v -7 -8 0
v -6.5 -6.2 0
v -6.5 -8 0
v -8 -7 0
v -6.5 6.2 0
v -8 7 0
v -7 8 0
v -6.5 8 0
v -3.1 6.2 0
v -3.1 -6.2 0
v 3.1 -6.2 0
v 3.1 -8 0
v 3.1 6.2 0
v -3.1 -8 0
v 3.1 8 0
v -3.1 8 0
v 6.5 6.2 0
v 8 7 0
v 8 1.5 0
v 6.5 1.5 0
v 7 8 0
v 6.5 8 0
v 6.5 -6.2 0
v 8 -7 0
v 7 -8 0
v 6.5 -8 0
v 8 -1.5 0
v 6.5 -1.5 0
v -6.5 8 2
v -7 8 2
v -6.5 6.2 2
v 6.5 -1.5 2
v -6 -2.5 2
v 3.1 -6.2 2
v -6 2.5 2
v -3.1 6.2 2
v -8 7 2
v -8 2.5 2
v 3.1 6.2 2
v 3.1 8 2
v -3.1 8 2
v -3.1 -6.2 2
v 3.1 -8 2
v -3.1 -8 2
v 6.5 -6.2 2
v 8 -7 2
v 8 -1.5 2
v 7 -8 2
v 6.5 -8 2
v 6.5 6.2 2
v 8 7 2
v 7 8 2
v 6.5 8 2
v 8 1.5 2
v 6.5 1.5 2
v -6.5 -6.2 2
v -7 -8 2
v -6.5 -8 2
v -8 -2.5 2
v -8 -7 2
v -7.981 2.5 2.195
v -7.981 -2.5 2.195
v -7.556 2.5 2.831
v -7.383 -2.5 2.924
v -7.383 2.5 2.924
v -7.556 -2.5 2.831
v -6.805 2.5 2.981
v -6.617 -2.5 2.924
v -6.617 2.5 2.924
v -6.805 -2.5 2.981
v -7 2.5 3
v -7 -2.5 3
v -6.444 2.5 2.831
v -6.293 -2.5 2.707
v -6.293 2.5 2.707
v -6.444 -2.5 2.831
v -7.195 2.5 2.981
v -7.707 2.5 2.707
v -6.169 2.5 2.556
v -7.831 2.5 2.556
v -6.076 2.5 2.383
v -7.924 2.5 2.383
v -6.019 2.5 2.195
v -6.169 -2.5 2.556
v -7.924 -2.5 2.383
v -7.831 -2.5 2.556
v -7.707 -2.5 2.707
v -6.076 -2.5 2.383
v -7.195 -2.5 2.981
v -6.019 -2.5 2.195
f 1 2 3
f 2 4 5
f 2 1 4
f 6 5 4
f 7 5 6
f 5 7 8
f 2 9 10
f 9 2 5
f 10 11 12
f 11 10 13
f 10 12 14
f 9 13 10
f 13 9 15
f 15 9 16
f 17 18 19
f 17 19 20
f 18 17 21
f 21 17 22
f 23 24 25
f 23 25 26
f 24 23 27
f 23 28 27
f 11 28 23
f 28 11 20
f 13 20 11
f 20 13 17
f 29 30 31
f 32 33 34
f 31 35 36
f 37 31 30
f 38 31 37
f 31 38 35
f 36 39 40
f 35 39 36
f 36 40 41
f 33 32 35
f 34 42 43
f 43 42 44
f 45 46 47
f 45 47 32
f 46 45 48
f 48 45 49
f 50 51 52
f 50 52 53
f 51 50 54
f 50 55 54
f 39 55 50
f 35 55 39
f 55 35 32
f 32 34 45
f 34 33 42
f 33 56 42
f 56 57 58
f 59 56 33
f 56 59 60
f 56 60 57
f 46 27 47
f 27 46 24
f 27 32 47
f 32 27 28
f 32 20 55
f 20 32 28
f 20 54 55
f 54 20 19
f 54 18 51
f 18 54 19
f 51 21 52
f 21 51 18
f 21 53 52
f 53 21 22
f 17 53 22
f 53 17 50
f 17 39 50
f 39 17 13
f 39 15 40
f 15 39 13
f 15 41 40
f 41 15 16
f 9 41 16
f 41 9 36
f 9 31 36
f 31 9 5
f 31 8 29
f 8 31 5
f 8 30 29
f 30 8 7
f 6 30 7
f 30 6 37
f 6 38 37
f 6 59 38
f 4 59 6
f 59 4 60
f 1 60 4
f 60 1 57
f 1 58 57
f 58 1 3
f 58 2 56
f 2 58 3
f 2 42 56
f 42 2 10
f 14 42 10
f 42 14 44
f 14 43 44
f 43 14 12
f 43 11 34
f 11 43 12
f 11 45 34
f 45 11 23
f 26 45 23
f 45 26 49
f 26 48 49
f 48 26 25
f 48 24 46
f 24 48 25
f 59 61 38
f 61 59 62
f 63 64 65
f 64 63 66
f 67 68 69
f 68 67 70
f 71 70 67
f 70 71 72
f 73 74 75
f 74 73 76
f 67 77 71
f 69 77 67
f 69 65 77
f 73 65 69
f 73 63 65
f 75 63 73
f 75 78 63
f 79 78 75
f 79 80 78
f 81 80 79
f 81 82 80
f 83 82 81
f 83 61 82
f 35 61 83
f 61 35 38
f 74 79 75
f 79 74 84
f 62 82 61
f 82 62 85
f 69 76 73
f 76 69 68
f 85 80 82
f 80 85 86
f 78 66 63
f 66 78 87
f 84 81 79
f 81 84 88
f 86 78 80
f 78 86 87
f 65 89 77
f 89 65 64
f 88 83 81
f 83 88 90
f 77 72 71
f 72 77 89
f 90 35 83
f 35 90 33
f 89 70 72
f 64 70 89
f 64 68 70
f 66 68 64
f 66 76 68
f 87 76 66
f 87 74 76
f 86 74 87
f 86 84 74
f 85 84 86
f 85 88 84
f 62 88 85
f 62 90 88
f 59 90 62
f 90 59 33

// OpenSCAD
//include <CenterStageField.scad>

PRINT_SCALER = 1;  // SET TO 1 FOR INCHES, 25.4 FOR MM

ROBOT_LENGTH = 16.0*PRINT_SCALER;
ROBOT_WIDTH  = 16.0*PRINT_SCALER;
CHAMF = 1.0*PRINT_SCALER;
ROBOT_HEIGHT = 2*PRINT_SCALER;
WHEEL_LEN    = 1.4*PRINT_SCALER;
WHEEL_WID    = 2.0*PRINT_SCALER;

function shiftStart(inX)     = -(inX+24);
function invertSpike(inPos)  = inPos-47;
function flipHeading(inHead) = inHead-180;  // used on blue side
function invertRight(inPos)  = -inPos-17;   // used on blue side
function flipValue(inPos)    = -inPos;      // used on blue side

function invertLeft(inPos) = -(inPos+34);   // used on red side

module robot_2D() {        
    difference() {
        polygon([[ROBOT_LENGTH/2,ROBOT_WIDTH/2-CHAMF],
        [ROBOT_LENGTH/2-CHAMF,ROBOT_WIDTH/2],
        [-ROBOT_LENGTH/2+CHAMF,ROBOT_WIDTH/2],
        [-ROBOT_LENGTH/2,ROBOT_WIDTH/2-CHAMF],
        [-ROBOT_LENGTH/2,-ROBOT_WIDTH/2+CHAMF],
        [-ROBOT_LENGTH/2+CHAMF,-ROBOT_WIDTH/2],
        [ROBOT_LENGTH/2-CHAMF,-ROBOT_WIDTH/2],
        [ROBOT_LENGTH/2,-ROBOT_WIDTH/2+CHAMF]]);
        //square([ROBOT_LENGTH,ROBOT_WIDTH],center=true); // represents robot outline
        
        // represents purple pixel holder in front of robot
        translate([ROBOT_LENGTH/2,0,0]) square([3*PRINT_SCALER,3*PRINT_SCALER],center=true);
        
        // represents robot wheels
        translate([ROBOT_LENGTH*.3,ROBOT_WIDTH*.45,0]) wheel();
        translate([-ROBOT_LENGTH*.3,ROBOT_WIDTH*.45,0]) wheel();
        translate([ROBOT_LENGTH*.3,-ROBOT_WIDTH*.45,0]) wheel();
        translate([-ROBOT_LENGTH*.3,-ROBOT_WIDTH*.45,0]) wheel();
    }
    module wheel() {
        hull() {
            translate([WHEEL_LEN/2,0,0]) square(WHEEL_WID,center=true);
            translate([-WHEEL_LEN/2,0,0]) square(WHEEL_WID,center=true);
        }
    }
}
//robot_2D($fn=30);  // Turn this line on to export the SVG for Easel

module robot(inColor) {  // 3D Chassis
    color(inColor) { // Intakes
        linear_extrude(ROBOT_HEIGHT) robot_2D();
    }
    
    color("green") { // Intakes
        translate([-7,0,ROBOT_HEIGHT]) rotate([90,90,0]) cylinder(h=5,d=2,center=true,$fn=32);
    }
}
//robot("blue");

module positionRobot(inColor="white",x=0,y=0,ang=0) {
    translate([x,y,0]) rotate([0,0,ang]) robot(inColor);
}
positionRobot();

module RunSimulation(xR,yR,zR,alphaR,betaR,phiR,
                     xL,yL,zL,alphaL,betaL,phiL) {
    translate([xR,yR,zR]) rotate([alphaR,betaR,phiR])  robot("plum");
    translate([xL,yL,zL]) rotate([alphaL,betaL,phiL])  robot("lightblue");
}
                     
module RunSimulationL(xL,yL,zL,alphaL,betaL,phiL) {
    translate([xL,yL,zL]) rotate([alphaL,betaL,phiL])  robot("lightblue");
}

module RunSimulationR(xR,yR,zR,alphaR,betaR,phiR) {
    translate([xR,yR,zR]) rotate([alphaR,betaR,phiR])  robot("plum");
}
